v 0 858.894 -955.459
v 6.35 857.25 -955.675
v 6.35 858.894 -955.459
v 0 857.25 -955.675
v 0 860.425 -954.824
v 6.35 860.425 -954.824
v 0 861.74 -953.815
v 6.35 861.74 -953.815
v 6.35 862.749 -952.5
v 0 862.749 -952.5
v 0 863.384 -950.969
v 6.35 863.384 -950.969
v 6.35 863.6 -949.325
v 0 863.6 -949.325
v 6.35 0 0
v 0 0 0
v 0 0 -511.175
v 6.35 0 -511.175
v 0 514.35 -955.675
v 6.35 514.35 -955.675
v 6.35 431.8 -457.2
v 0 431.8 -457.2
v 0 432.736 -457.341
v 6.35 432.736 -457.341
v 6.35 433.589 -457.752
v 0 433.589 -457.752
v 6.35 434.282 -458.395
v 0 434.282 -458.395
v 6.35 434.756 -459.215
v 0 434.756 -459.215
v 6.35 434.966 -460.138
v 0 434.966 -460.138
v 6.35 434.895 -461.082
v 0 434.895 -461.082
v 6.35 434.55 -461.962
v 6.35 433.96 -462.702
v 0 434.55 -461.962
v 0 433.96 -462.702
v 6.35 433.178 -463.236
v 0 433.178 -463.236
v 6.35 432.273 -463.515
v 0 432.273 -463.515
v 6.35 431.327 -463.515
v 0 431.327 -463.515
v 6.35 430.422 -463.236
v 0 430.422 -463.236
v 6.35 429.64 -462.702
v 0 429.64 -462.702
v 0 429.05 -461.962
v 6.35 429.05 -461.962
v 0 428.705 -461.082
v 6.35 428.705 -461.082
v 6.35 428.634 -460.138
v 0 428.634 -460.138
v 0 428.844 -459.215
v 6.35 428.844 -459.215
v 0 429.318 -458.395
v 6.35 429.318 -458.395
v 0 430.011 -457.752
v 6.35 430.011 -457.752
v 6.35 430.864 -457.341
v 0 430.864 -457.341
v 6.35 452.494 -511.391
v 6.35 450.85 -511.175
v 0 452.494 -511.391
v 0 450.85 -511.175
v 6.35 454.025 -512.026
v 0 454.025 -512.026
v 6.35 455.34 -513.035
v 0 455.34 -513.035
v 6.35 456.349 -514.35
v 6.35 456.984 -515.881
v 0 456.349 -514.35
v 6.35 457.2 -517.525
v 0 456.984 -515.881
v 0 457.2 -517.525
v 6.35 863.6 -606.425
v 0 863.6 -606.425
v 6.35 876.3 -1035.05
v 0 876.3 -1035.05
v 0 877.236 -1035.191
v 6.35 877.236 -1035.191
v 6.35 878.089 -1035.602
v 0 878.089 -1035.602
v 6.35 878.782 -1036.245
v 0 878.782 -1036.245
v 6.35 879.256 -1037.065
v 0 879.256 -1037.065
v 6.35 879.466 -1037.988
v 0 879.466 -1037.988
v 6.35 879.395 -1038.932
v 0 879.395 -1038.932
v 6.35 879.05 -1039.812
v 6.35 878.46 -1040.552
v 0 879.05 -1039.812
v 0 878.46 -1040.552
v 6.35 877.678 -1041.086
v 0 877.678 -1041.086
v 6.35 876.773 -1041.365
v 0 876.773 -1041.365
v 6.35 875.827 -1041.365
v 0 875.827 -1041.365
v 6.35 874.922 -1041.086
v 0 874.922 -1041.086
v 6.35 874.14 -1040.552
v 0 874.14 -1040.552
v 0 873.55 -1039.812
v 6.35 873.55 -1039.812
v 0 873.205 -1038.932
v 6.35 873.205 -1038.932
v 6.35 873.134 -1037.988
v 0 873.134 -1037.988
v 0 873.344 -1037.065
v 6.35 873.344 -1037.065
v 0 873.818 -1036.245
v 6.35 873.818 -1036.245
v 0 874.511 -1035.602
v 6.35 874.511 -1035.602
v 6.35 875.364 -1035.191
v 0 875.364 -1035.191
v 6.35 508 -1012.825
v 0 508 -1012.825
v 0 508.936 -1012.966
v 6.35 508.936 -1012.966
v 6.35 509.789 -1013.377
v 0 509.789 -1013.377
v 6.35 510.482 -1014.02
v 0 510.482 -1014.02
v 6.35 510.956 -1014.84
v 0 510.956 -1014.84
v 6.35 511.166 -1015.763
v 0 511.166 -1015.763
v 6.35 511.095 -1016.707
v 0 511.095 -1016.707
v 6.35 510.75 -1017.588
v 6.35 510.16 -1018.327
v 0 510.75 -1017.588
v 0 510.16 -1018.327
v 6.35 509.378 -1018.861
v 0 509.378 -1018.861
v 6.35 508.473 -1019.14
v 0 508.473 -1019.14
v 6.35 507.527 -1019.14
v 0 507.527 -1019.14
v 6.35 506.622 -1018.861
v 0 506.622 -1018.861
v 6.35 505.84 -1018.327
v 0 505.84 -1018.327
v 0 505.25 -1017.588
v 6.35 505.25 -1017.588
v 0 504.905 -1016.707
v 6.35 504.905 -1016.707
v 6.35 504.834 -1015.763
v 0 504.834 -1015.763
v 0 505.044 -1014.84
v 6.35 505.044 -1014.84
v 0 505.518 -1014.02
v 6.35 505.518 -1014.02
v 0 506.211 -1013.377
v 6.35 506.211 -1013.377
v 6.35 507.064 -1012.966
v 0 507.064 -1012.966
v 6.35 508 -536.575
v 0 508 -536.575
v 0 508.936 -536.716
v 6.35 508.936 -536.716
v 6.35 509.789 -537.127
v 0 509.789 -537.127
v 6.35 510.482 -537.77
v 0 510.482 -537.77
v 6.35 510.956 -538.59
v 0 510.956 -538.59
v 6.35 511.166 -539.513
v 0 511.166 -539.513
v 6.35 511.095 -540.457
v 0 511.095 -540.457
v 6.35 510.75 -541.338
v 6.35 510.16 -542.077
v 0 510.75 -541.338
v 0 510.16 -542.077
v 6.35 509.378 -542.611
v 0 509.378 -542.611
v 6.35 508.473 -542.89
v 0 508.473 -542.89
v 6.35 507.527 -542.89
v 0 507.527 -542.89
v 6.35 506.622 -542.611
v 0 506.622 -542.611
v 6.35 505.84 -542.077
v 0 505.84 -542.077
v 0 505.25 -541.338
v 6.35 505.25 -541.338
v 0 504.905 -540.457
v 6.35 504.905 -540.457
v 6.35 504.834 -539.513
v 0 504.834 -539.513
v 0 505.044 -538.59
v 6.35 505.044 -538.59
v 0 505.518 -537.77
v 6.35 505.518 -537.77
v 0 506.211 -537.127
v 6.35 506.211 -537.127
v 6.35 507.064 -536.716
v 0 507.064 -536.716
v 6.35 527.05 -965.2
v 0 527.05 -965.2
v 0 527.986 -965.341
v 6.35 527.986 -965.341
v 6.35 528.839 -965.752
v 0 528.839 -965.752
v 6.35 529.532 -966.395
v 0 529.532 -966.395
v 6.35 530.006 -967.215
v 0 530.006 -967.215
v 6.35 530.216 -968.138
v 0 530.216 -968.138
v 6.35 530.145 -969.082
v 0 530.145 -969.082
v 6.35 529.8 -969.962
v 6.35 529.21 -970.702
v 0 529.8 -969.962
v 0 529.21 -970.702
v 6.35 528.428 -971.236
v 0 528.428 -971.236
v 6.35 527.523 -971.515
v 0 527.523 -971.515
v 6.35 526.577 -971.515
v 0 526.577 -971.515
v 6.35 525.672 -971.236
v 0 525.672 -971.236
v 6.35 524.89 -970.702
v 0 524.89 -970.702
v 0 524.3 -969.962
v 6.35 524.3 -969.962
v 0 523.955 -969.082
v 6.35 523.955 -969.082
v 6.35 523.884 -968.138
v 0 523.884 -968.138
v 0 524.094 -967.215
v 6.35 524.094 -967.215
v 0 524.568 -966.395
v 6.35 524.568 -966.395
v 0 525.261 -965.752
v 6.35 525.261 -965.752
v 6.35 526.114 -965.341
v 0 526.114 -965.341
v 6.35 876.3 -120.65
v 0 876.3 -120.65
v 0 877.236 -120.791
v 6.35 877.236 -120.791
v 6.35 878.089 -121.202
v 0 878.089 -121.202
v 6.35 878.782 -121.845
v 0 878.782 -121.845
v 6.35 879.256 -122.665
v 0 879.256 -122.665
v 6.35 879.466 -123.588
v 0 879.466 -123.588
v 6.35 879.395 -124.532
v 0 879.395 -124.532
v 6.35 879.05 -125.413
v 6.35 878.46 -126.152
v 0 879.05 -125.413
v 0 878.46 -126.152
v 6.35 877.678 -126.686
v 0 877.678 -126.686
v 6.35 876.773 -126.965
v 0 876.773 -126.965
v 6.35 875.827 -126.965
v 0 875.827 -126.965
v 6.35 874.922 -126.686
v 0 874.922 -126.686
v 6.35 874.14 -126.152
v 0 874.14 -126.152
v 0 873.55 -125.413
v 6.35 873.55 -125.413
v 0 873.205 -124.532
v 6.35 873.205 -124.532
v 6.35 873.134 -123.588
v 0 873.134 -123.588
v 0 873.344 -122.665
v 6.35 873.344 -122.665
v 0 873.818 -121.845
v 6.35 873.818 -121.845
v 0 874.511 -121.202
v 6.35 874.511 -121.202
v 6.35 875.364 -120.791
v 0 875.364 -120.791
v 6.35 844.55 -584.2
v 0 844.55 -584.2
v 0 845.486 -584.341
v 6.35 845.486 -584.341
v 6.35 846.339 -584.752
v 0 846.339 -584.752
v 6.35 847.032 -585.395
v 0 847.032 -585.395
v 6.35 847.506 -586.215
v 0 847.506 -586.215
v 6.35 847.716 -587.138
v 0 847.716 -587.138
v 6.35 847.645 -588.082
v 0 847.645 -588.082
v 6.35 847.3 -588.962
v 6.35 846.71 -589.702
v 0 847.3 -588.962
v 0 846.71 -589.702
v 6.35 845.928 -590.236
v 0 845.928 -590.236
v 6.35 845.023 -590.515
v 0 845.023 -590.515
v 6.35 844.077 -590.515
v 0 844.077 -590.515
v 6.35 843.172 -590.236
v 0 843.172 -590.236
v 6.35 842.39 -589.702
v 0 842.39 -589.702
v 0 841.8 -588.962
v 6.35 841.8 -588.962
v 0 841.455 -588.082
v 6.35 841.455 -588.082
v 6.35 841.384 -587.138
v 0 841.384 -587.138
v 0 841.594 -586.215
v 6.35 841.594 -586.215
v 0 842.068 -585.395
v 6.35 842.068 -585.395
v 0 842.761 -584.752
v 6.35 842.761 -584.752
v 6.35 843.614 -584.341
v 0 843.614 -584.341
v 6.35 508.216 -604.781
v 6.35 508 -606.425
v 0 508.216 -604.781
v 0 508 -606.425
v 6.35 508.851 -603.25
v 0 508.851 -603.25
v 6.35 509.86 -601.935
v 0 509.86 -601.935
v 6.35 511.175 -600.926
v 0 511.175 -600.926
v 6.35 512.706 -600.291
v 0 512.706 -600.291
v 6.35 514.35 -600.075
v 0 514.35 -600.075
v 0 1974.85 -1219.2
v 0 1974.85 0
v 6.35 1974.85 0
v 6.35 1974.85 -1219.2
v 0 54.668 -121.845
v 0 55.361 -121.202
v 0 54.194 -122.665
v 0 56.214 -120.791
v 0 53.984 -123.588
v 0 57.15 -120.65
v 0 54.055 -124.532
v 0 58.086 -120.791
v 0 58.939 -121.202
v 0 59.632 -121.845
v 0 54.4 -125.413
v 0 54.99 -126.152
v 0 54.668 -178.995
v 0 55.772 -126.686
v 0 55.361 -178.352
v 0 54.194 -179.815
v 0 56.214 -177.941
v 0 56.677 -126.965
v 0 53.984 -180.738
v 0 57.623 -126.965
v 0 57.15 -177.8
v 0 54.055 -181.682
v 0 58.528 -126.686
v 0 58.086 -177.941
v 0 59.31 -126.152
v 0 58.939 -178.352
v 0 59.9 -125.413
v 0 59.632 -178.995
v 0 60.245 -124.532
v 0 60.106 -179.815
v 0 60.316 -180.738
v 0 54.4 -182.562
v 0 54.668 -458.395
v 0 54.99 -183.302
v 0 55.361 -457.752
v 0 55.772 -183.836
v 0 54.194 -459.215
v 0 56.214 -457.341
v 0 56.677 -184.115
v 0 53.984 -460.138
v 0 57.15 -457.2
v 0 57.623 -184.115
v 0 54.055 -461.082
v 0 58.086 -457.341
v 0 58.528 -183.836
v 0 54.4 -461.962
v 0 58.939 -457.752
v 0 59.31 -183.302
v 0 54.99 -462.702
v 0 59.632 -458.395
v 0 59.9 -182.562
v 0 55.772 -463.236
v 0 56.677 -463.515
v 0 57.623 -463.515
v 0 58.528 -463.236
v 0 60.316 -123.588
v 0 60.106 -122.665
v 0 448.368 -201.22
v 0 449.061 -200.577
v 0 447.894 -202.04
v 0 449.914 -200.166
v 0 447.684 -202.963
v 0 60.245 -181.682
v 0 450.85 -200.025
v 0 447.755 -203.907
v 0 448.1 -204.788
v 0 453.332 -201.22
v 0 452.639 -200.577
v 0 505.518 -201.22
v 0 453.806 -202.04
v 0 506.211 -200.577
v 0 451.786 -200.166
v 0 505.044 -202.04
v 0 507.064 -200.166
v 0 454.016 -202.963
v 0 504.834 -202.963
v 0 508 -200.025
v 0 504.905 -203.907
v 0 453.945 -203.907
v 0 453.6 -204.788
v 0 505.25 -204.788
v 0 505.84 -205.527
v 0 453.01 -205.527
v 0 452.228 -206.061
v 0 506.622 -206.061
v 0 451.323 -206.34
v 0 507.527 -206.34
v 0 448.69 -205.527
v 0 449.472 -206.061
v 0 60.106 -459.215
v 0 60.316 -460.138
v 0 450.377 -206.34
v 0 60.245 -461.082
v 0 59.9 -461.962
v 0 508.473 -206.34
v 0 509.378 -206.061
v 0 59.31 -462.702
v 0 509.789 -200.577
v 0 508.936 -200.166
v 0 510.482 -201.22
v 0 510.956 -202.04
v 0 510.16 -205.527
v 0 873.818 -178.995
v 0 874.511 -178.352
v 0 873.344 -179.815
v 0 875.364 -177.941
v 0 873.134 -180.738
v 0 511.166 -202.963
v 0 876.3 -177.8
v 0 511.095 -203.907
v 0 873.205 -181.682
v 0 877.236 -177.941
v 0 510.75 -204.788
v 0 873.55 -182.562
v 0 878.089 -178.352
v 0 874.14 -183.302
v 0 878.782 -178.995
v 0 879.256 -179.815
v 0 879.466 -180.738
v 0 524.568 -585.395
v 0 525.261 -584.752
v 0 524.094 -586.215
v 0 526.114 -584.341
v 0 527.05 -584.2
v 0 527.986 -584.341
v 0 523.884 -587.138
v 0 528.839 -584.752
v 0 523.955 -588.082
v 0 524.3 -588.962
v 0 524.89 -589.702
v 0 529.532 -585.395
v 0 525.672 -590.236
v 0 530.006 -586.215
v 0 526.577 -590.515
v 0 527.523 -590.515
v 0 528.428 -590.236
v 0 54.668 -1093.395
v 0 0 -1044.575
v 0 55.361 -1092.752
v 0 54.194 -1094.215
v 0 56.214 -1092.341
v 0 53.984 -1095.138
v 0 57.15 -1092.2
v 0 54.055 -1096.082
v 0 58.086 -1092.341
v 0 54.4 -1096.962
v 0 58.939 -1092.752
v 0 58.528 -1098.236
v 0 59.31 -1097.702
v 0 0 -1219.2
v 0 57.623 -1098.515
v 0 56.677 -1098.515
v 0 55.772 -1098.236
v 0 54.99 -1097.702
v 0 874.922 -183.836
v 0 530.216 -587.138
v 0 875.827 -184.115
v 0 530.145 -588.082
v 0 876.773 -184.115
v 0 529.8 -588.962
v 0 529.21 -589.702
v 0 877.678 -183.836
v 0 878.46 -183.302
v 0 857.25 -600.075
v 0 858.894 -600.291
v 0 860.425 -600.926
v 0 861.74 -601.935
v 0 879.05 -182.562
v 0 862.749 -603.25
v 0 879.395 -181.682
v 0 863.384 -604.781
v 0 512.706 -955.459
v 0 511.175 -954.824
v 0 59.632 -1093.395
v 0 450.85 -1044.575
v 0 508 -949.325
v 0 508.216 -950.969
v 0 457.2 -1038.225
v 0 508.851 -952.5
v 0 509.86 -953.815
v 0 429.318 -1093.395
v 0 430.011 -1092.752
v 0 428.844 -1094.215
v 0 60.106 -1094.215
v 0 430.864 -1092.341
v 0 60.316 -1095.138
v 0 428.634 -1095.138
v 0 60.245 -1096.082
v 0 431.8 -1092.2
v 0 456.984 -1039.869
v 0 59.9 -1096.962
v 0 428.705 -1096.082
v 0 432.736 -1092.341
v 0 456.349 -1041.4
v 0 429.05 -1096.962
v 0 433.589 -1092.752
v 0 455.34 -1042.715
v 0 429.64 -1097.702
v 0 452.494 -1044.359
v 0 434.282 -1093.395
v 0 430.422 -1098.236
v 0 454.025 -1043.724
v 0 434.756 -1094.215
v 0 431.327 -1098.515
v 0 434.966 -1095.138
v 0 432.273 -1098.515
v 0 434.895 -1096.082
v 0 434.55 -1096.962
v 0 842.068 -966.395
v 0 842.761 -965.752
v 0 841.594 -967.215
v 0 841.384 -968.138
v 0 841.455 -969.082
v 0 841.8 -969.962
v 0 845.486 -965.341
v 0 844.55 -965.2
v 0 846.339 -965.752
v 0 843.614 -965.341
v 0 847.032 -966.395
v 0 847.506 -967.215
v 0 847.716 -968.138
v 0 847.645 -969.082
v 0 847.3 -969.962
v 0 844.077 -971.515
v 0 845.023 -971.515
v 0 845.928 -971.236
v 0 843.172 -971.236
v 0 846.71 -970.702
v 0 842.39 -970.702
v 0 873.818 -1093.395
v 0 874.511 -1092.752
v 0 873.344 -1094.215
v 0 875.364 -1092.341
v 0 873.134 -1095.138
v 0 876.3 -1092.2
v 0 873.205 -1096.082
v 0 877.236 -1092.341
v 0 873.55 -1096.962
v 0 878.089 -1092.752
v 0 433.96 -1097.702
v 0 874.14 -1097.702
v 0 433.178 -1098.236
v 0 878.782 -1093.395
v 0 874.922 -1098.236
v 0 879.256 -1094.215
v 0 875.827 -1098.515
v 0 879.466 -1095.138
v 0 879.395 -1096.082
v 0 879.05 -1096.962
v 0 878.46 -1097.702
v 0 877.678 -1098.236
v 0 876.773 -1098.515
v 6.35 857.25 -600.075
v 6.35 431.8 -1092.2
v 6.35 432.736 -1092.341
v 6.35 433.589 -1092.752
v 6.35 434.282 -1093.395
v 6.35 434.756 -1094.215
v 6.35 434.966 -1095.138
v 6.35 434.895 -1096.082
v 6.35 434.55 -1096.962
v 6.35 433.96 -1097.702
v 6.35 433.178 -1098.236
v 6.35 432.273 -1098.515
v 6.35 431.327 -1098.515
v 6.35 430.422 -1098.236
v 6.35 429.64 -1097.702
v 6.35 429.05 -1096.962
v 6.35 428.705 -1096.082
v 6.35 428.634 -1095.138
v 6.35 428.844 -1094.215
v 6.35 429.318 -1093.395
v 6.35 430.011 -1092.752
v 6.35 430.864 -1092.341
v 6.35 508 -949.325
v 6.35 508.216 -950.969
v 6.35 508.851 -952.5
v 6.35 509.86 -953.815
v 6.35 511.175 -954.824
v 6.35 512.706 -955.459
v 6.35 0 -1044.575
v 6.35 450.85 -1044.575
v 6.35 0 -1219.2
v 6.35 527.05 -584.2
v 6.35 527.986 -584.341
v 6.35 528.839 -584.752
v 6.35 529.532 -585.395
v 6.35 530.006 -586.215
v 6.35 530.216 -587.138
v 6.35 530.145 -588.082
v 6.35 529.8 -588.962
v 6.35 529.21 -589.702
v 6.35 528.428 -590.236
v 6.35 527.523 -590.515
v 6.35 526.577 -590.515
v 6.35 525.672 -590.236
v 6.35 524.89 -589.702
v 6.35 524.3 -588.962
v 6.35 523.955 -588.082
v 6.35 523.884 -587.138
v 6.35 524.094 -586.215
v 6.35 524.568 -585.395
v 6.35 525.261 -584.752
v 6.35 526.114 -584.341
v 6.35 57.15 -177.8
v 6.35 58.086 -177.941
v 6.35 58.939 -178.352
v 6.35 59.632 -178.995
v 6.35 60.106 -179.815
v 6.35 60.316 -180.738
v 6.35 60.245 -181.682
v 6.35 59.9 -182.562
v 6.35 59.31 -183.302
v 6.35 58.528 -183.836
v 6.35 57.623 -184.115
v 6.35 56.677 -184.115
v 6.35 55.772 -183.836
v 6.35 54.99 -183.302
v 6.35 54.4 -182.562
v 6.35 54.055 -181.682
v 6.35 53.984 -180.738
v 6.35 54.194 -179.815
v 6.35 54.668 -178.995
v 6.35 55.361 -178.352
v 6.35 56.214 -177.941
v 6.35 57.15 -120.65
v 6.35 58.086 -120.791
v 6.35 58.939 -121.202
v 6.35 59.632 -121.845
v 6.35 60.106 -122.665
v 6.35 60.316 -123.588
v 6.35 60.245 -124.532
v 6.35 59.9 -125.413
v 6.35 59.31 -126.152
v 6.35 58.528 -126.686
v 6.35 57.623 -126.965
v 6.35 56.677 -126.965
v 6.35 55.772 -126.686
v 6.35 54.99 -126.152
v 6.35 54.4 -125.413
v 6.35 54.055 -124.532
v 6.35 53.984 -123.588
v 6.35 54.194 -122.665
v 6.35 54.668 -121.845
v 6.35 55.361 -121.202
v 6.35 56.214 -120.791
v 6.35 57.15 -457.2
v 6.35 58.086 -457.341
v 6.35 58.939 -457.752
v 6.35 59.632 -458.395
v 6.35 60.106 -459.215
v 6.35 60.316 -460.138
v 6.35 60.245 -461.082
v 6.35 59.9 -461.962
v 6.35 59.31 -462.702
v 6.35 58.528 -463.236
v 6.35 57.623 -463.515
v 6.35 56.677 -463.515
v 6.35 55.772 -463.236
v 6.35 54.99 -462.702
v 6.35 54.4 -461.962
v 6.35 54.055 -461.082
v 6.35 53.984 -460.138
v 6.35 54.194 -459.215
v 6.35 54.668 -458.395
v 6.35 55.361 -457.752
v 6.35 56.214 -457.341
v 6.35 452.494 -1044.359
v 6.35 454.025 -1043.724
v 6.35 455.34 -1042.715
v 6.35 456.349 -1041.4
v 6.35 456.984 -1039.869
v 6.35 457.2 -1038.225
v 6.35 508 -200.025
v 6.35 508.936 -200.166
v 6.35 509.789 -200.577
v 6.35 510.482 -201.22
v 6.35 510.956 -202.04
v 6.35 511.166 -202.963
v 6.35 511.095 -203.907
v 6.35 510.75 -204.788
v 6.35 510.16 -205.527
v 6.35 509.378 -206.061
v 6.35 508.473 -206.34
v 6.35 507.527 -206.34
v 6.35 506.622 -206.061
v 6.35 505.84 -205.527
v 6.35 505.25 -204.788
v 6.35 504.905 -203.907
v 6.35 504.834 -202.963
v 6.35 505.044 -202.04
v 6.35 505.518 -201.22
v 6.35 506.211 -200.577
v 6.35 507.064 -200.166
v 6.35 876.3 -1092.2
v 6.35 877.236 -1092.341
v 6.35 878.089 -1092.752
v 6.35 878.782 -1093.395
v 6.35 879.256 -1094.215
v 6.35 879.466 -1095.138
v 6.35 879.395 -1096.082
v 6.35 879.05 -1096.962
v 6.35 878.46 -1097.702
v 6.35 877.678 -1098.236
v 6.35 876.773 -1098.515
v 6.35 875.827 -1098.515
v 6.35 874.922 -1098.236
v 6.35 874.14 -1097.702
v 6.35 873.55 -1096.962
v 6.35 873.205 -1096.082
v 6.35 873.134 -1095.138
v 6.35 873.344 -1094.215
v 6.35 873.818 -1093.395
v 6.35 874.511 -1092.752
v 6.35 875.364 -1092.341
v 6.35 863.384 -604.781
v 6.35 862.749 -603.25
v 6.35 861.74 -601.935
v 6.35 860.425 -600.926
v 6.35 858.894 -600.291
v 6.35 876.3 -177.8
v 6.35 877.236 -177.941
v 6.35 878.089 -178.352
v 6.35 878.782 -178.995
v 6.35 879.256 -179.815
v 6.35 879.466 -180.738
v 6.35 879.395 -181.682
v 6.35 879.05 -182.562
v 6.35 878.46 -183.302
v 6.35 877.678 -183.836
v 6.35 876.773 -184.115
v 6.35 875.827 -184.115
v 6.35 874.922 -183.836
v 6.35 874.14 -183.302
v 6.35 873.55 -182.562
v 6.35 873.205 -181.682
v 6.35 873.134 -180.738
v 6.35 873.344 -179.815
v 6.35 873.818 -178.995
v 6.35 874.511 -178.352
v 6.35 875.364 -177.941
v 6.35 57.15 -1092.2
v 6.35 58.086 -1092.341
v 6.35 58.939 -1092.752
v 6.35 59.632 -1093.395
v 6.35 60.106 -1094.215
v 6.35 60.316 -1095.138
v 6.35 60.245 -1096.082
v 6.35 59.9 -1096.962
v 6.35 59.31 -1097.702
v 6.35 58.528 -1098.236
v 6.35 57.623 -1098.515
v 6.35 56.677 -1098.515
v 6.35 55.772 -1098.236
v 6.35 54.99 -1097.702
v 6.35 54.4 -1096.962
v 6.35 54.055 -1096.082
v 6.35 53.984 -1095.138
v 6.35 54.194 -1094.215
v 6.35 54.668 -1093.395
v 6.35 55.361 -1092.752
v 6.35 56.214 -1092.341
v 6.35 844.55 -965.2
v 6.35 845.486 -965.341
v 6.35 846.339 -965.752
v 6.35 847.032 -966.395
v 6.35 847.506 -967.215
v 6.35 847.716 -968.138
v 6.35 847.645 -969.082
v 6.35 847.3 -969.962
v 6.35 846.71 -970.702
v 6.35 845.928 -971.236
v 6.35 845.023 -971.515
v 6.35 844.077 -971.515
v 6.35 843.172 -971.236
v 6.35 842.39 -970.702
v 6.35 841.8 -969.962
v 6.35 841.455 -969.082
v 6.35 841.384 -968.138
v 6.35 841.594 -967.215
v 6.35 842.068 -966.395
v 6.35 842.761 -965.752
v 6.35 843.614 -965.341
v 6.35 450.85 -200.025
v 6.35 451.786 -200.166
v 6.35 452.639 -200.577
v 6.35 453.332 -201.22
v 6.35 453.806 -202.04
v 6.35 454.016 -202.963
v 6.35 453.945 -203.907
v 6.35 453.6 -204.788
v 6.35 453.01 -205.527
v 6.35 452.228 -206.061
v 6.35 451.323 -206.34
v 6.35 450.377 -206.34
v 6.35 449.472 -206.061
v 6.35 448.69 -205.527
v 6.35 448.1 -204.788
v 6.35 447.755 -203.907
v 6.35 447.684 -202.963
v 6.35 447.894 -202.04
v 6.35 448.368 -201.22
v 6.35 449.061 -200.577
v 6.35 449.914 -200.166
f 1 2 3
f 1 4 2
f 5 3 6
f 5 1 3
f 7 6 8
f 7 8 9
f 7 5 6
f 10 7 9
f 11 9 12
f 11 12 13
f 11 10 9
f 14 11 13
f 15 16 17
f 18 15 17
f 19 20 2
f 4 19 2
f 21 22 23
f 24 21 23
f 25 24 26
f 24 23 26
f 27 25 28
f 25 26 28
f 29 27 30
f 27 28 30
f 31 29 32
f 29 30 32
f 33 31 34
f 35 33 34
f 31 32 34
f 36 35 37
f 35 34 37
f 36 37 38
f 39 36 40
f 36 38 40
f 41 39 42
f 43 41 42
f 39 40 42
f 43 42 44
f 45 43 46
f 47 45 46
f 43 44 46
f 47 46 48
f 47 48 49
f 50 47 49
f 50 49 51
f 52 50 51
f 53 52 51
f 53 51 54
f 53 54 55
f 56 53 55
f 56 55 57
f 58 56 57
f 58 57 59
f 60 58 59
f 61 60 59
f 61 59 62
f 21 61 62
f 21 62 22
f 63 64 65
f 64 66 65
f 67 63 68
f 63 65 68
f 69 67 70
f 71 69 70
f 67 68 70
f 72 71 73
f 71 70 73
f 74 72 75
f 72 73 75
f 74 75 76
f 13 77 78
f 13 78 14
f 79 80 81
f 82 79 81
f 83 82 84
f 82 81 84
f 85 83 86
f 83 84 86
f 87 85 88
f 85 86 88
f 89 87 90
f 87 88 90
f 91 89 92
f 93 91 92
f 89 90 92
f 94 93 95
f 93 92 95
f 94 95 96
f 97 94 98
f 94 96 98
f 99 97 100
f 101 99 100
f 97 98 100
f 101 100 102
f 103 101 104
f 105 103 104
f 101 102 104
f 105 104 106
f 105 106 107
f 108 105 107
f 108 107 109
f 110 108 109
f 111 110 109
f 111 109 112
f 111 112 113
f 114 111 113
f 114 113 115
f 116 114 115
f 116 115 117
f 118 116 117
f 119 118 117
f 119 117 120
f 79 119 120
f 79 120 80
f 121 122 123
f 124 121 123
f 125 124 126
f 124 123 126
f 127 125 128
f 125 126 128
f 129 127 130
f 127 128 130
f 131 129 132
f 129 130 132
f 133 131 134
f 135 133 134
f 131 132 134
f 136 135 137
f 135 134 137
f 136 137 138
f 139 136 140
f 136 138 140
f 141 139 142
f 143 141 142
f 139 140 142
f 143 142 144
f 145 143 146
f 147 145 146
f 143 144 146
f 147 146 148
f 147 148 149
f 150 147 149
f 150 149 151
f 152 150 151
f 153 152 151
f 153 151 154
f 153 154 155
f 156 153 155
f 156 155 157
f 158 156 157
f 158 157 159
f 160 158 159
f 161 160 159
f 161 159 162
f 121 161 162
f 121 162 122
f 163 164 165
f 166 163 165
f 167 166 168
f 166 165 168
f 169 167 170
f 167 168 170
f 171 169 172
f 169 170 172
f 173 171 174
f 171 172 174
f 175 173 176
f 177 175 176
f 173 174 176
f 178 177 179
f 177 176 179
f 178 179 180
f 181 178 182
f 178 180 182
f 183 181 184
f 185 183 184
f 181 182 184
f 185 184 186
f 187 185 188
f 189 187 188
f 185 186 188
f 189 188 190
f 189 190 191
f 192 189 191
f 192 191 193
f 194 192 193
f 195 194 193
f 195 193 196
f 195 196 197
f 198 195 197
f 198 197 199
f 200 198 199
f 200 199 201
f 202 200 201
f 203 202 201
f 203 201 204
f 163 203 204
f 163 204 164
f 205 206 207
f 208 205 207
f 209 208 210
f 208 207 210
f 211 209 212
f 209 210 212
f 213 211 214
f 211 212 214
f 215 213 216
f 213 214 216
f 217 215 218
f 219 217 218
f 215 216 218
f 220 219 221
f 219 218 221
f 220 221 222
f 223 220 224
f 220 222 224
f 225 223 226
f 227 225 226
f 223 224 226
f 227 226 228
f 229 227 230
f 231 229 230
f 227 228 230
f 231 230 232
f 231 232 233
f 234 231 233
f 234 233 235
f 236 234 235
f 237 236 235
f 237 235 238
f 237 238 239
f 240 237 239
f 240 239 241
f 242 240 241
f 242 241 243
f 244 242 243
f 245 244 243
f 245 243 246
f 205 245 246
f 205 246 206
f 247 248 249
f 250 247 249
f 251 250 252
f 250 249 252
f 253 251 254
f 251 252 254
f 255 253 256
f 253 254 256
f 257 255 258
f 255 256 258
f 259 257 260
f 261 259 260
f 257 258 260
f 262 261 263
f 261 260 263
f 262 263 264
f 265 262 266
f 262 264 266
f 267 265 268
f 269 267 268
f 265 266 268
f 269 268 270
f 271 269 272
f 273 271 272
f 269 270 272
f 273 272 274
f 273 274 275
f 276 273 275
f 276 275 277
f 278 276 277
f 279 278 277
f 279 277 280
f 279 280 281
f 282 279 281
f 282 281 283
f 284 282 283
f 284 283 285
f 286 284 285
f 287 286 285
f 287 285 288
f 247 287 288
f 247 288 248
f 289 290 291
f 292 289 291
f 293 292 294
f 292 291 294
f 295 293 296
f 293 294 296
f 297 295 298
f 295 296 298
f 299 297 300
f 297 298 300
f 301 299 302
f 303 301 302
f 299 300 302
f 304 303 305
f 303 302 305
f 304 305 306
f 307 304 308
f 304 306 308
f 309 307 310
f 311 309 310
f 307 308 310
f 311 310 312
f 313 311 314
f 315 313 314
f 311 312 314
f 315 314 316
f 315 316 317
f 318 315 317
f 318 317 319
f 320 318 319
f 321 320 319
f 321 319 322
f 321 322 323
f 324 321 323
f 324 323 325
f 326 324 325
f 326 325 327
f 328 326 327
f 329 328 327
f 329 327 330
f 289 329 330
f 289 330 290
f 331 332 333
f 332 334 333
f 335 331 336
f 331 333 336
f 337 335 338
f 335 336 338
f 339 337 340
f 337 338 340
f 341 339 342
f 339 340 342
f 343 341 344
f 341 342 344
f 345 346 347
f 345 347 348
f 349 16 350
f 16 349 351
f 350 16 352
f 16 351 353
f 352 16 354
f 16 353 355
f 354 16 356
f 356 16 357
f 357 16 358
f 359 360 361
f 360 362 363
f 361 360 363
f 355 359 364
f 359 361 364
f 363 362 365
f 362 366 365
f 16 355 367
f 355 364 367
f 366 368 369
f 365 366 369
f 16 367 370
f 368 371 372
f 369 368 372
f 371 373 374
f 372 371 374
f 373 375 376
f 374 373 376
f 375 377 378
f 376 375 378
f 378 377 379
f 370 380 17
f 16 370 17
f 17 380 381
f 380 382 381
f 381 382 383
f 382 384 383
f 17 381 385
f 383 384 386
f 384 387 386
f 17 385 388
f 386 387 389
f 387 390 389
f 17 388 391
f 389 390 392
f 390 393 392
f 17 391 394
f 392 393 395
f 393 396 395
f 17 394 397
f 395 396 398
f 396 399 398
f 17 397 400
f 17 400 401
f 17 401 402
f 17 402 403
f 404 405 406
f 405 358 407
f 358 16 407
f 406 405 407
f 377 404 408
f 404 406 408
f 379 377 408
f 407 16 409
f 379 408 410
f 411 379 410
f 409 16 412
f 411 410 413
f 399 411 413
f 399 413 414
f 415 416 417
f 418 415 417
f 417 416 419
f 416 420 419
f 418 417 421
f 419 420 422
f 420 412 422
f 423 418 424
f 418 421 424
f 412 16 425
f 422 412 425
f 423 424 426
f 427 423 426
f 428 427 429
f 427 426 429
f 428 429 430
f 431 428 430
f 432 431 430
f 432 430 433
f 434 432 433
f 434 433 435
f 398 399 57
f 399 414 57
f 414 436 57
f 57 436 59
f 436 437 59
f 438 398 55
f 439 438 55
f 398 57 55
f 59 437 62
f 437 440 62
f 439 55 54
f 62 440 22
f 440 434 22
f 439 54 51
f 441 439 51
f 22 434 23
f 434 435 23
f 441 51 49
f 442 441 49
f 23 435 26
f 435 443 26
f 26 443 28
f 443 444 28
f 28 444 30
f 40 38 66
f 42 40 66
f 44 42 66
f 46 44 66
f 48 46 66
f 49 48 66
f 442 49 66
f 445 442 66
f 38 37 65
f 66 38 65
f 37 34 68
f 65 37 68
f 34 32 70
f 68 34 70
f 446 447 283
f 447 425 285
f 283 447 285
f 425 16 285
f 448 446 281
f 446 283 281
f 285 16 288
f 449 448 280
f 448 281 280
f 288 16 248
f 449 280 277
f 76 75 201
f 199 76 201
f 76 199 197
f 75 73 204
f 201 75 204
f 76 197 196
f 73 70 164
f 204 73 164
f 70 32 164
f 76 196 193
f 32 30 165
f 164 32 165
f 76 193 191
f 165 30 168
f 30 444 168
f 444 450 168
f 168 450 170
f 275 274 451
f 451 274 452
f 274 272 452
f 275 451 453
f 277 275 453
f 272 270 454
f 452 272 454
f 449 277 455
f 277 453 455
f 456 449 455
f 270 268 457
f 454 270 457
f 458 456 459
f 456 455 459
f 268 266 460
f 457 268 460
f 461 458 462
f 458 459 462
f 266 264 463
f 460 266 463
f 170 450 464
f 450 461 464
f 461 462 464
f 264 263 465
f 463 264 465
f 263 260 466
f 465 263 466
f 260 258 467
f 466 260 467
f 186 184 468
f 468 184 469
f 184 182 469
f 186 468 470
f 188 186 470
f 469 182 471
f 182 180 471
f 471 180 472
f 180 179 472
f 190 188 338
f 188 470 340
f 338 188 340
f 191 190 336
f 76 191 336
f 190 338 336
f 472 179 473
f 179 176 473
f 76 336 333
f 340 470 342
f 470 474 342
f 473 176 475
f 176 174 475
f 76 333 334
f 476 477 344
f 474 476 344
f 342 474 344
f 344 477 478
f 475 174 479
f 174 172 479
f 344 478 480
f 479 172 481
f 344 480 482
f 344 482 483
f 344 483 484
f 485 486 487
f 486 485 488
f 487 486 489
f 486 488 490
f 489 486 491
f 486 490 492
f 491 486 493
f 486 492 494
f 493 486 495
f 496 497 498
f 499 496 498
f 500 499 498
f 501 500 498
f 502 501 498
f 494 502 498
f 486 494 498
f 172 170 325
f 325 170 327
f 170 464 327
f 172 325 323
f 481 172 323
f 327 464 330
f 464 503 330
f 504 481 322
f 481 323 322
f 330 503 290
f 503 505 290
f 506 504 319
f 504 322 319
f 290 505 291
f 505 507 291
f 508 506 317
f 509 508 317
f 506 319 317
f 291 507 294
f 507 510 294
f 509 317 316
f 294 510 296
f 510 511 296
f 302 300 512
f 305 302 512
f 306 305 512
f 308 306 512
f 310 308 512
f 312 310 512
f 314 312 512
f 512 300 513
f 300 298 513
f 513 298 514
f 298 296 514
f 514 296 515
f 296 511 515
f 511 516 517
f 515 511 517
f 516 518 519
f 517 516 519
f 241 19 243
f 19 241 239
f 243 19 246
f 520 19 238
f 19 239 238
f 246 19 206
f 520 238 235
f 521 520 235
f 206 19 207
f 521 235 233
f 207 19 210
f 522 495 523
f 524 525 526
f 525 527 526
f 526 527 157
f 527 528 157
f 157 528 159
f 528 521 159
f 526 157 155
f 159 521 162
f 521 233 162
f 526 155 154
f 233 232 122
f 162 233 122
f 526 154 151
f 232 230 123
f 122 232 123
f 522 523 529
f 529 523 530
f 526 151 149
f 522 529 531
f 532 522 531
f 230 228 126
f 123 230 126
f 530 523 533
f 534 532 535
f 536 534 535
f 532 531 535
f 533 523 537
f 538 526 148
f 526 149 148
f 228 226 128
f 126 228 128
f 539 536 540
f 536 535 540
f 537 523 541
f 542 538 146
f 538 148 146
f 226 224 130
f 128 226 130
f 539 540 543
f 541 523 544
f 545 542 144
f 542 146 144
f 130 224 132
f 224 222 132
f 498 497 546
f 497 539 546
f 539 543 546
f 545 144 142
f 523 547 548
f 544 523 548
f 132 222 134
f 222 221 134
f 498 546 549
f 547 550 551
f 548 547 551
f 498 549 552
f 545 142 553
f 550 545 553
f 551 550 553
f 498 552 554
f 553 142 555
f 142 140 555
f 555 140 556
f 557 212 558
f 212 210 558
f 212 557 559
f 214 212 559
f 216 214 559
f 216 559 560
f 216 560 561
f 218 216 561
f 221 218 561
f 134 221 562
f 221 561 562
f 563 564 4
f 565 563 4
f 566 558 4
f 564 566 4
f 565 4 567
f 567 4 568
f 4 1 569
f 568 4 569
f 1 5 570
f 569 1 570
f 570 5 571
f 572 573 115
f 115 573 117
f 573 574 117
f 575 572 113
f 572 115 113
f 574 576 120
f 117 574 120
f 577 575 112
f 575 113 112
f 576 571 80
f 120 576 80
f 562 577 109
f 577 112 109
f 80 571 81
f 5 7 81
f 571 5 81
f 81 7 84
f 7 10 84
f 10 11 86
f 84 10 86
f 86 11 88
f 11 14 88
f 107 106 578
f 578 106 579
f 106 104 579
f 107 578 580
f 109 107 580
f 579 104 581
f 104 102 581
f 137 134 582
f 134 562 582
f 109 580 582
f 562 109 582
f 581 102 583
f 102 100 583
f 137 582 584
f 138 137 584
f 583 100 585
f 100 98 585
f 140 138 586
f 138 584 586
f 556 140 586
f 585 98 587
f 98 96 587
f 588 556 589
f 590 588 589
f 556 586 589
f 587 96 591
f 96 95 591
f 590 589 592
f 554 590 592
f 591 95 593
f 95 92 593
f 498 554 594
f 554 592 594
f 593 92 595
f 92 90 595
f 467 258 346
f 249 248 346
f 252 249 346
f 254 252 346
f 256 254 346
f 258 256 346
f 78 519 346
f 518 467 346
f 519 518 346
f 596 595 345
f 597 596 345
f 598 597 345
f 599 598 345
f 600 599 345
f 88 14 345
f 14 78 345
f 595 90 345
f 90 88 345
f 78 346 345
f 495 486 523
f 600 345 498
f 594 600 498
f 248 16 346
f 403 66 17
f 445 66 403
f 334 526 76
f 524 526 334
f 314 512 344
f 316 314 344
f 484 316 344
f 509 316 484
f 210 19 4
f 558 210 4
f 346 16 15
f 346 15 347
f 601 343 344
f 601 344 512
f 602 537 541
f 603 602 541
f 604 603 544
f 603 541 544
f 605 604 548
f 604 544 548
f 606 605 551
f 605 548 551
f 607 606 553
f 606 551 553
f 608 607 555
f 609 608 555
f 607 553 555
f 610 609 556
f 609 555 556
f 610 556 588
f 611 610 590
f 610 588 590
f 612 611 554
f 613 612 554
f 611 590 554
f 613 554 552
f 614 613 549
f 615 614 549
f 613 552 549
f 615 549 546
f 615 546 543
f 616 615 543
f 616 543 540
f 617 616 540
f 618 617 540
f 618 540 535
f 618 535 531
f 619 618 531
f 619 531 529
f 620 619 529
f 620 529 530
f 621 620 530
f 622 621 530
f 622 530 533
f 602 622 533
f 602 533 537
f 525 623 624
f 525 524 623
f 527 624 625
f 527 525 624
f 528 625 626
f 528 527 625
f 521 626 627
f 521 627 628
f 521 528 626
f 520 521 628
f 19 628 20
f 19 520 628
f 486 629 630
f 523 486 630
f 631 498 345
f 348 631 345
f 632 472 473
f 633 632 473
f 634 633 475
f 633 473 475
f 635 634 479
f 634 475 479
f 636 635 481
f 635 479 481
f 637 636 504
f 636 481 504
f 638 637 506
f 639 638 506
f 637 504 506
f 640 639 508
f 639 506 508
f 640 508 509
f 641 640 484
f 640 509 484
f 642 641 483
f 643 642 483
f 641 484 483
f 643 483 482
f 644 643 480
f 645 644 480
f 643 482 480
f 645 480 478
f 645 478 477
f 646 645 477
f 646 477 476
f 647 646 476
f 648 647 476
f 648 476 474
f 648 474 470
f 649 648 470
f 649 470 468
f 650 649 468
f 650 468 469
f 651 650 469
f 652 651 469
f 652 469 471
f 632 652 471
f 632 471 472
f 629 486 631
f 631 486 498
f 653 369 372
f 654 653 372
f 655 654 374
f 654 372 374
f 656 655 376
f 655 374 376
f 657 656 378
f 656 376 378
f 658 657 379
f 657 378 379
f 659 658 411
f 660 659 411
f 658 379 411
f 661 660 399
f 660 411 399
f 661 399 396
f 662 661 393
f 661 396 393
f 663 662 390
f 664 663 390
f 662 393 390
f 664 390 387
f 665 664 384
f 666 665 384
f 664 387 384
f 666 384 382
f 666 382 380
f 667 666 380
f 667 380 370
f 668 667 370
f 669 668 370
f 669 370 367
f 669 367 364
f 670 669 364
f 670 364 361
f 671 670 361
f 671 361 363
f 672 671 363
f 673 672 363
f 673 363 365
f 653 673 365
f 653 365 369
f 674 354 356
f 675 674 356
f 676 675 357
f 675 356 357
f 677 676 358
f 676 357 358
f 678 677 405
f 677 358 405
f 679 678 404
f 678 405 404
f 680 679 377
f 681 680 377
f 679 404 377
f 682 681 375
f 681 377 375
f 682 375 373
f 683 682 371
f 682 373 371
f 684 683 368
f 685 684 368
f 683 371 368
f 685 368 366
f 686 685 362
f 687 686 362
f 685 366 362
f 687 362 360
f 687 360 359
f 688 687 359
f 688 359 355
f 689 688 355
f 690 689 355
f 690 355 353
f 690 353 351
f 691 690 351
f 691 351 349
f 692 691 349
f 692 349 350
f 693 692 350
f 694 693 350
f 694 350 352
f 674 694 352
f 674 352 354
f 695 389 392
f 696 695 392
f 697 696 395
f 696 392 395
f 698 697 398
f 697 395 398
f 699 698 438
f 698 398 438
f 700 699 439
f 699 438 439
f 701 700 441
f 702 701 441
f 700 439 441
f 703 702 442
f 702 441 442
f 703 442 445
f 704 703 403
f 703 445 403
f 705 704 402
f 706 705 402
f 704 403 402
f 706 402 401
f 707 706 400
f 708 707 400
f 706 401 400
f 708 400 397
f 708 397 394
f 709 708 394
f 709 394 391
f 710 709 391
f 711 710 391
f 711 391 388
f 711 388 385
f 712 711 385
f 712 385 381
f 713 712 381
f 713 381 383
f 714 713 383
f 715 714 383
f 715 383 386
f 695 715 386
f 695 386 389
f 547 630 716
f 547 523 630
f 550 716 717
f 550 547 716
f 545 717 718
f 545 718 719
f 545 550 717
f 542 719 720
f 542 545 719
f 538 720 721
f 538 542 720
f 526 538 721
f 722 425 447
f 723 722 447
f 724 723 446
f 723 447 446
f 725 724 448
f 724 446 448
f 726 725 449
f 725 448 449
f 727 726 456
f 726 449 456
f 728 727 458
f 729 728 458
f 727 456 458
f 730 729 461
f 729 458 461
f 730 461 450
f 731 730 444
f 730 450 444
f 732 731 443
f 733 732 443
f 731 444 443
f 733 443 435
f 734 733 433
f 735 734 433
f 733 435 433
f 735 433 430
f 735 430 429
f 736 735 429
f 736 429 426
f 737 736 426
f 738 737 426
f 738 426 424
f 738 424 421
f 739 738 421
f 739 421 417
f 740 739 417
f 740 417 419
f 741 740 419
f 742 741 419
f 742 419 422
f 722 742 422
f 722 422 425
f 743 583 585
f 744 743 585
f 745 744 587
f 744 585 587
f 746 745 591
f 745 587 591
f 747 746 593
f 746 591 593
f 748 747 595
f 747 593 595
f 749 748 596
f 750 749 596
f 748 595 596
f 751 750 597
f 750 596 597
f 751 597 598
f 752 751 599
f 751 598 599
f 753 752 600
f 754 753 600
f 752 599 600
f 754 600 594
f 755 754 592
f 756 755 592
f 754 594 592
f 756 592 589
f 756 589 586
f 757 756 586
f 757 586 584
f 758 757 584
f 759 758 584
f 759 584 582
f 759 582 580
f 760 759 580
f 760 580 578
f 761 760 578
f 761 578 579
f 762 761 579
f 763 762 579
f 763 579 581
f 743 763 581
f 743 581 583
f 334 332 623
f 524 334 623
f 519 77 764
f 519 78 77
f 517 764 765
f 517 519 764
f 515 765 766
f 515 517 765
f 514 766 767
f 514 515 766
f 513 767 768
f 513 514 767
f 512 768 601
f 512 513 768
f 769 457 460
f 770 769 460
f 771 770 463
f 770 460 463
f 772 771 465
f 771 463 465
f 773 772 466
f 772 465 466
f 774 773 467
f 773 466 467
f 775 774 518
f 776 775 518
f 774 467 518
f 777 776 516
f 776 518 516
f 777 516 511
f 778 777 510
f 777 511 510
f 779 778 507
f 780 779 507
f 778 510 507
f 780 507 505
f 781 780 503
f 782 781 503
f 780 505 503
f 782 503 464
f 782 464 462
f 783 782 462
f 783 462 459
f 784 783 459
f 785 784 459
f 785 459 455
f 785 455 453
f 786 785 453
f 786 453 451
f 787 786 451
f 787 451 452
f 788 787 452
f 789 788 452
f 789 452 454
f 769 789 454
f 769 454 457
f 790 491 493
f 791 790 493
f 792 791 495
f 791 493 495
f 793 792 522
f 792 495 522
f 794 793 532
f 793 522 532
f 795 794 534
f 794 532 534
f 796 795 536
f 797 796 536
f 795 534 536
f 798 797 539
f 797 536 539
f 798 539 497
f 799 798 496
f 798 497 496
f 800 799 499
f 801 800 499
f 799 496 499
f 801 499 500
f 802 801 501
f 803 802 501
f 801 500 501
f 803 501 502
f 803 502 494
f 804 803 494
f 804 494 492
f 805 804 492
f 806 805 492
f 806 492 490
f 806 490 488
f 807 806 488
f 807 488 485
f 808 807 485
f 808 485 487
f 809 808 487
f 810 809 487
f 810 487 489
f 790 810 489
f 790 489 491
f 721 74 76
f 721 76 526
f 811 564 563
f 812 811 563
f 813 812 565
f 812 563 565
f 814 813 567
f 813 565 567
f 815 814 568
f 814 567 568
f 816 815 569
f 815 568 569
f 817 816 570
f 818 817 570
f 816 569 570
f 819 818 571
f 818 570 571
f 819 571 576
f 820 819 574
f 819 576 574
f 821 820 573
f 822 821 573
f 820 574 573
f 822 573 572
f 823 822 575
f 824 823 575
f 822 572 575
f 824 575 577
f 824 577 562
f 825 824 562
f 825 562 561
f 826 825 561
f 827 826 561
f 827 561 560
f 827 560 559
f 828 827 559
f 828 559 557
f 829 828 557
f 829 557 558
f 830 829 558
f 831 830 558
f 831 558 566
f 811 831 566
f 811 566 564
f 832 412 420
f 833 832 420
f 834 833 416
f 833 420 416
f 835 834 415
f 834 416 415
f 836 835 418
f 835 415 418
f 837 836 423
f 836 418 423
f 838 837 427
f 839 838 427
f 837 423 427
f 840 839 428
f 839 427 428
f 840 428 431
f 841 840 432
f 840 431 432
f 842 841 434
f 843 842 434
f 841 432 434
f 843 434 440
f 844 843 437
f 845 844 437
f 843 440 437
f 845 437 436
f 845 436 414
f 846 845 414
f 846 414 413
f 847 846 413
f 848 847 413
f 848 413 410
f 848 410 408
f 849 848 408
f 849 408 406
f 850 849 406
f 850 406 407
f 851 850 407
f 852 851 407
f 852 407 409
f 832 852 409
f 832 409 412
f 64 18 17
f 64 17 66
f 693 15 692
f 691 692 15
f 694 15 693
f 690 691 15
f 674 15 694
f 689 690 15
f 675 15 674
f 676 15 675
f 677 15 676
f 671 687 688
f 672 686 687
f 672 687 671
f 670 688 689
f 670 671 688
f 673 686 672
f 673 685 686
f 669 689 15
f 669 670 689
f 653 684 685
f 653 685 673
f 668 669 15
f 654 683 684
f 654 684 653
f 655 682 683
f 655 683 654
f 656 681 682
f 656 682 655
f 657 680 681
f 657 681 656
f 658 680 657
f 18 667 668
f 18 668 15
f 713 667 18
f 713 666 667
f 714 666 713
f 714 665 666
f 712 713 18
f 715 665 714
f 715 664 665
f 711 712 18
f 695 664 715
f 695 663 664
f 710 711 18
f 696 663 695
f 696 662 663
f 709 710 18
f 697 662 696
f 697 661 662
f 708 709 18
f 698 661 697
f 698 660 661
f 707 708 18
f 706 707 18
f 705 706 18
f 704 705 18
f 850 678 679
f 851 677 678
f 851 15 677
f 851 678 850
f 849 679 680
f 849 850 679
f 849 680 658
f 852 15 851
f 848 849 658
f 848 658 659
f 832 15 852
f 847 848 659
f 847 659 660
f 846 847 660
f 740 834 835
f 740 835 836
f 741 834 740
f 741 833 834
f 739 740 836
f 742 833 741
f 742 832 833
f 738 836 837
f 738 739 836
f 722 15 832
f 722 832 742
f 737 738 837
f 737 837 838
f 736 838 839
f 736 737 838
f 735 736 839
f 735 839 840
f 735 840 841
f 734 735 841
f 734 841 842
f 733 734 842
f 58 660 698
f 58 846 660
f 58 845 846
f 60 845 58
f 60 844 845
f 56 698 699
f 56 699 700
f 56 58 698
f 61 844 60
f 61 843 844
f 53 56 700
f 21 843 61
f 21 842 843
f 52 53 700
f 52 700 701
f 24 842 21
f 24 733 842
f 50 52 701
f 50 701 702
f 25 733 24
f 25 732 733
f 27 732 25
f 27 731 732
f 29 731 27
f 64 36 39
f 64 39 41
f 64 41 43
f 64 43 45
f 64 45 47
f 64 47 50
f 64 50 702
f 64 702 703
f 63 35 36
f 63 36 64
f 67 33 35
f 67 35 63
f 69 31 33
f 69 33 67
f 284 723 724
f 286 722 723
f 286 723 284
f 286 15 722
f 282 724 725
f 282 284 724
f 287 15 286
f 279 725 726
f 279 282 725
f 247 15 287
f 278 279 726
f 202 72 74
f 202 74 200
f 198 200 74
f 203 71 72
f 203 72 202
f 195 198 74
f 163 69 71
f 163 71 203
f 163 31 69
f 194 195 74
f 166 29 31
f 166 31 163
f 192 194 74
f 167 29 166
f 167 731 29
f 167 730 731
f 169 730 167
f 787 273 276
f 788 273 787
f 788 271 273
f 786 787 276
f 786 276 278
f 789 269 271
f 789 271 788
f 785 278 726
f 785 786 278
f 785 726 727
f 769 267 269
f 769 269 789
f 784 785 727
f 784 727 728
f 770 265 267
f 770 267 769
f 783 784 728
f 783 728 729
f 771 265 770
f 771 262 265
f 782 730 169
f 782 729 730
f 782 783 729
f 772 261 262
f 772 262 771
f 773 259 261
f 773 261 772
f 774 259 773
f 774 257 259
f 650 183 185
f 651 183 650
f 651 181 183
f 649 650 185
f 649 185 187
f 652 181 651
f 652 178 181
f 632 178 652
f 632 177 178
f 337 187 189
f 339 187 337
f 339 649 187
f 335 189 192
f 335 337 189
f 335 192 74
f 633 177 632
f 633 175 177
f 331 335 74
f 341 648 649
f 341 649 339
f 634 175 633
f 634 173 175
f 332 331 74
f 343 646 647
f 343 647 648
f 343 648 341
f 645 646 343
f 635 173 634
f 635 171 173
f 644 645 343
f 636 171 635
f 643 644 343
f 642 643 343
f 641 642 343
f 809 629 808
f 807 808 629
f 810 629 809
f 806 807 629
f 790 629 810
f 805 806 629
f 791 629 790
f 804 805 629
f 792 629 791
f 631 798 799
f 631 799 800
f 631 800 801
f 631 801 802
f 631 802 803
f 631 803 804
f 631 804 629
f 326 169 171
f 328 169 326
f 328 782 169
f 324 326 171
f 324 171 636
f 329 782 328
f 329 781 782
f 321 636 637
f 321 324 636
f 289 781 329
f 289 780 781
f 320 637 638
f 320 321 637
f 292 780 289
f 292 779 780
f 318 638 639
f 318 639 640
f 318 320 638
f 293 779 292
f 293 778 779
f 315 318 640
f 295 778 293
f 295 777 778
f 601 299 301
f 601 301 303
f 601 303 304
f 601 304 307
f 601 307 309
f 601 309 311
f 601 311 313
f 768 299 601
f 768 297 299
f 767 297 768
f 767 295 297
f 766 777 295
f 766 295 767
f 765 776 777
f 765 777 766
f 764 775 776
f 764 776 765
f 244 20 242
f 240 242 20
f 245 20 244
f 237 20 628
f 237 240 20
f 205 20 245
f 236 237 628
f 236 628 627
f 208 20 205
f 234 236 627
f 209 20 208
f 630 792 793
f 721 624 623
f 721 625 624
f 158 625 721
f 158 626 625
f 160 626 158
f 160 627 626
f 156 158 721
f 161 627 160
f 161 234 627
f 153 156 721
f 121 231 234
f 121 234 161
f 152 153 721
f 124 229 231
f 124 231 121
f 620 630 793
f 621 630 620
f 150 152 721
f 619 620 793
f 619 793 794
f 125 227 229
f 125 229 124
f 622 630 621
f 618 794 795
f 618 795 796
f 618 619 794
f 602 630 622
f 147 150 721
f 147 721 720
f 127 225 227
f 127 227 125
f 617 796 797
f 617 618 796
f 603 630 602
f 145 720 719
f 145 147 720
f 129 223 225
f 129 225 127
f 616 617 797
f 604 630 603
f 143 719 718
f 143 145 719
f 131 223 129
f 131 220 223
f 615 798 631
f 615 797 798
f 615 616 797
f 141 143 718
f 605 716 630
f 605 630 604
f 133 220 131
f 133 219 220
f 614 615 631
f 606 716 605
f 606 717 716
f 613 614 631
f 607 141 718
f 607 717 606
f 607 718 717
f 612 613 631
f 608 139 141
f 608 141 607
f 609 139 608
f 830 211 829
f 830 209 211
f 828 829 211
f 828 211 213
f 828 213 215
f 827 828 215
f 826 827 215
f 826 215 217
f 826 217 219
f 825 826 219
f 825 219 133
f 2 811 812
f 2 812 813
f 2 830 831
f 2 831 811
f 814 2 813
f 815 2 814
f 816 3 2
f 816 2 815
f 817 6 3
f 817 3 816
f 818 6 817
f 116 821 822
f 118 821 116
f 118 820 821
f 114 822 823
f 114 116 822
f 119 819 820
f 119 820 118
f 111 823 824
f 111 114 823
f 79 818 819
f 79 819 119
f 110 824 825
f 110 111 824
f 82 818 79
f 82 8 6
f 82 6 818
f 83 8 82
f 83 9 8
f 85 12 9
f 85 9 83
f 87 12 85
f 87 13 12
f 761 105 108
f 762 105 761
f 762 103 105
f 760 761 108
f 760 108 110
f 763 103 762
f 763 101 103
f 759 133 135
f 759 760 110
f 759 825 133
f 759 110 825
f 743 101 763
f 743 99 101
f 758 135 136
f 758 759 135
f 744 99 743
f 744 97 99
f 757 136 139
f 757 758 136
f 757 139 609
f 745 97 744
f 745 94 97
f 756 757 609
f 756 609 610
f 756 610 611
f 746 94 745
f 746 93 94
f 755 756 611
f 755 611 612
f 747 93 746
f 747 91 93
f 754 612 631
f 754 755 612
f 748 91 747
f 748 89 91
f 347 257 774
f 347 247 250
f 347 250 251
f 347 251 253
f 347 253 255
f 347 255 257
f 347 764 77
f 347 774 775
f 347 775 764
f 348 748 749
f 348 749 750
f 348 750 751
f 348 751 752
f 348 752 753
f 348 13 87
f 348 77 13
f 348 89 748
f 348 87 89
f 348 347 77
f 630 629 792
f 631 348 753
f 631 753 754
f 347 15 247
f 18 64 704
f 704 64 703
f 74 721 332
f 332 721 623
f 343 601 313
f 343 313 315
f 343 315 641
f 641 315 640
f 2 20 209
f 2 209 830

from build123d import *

# Parameters (mm, degrees)
SKETCH1_W                   = 1219.2
SKETCH1_H                   = 1974.85
BOSS_EXTRUDE1_DEPTH         = 6.35
SKETCH2_W                   = 533.4
SKETCH2_H                   = 457.2
SKETCH2_W_2                 = 355.6
SKETCH2_H_2                 = 355.6
CUT_EXTRUDE1_DEPTH          = 7.35
FILLET1_R                   = 6.35
F_1_4_0_25_DIAMETER_HOLE1_D = 6.35


with BuildPart() as part:
    # Sketch1 → Boss-Extrude1 (new body)
    with BuildSketch(Plane(origin=(0, 0, 0), x_dir=(0, 0, -1), z_dir=(1, 0, 0))):
        with Locations((609.6, 987.425)):
            Rectangle(SKETCH1_W, SKETCH1_H)
    extrude(amount=BOSS_EXTRUDE1_DEPTH)

    # Sketch2 → Cut-Extrude1 (cut, through all)
    with BuildSketch(Plane(origin=(6.35, 0, 0), x_dir=(0, 0, -1), z_dir=(1, 0, 0))):
        with Locations((777.875, 228.6)):
            Rectangle(SKETCH2_W, SKETCH2_H)
        with Locations((777.875, 685.8)):
            Rectangle(SKETCH2_W_2, SKETCH2_H_2)
    extrude(amount=-CUT_EXTRUDE1_DEPTH, mode=Mode.SUBTRACT)

    # Fillet1
    fillet1_edges = [part.edges().sort_by_distance(p)[0] for p in [
        (3.175, 457.2, -1044.575),
        (3.175, 457.2, -511.175),
        (3.175, 863.6, -955.675),
        (3.175, 508, -955.675),
        (3.175, 508, -600.075),
        (3.175, 863.6, -600.075),
    ]]
    fillet(fillet1_edges, radius=FILLET1_R)

    # 1/4 (0.25) Diameter Hole1 (through all)
    with Locations(Plane(origin=(6.35, 0, 0), x_dir=(0, 0, -1), z_dir=(1, 0, 0))):
        with Locations((1095.375, 57.15), (1095.375, 431.8), (1095.375, 876.3), (968.375, 844.55), (587.375, 844.55), (587.375, 527.05), (968.375, 527.05), (1016, 508), (1038.225, 876.3), (539.75, 508), (460.375, 431.8), (460.375, 57.15), (180.975, 876.3), (203.2, 508), (203.2, 450.85), (123.825, 876.3), (180.975, 57.15), (123.825, 57.15)):
            Hole(F_1_4_0_25_DIAMETER_HOLE1_D / 2)


solid = part.part
